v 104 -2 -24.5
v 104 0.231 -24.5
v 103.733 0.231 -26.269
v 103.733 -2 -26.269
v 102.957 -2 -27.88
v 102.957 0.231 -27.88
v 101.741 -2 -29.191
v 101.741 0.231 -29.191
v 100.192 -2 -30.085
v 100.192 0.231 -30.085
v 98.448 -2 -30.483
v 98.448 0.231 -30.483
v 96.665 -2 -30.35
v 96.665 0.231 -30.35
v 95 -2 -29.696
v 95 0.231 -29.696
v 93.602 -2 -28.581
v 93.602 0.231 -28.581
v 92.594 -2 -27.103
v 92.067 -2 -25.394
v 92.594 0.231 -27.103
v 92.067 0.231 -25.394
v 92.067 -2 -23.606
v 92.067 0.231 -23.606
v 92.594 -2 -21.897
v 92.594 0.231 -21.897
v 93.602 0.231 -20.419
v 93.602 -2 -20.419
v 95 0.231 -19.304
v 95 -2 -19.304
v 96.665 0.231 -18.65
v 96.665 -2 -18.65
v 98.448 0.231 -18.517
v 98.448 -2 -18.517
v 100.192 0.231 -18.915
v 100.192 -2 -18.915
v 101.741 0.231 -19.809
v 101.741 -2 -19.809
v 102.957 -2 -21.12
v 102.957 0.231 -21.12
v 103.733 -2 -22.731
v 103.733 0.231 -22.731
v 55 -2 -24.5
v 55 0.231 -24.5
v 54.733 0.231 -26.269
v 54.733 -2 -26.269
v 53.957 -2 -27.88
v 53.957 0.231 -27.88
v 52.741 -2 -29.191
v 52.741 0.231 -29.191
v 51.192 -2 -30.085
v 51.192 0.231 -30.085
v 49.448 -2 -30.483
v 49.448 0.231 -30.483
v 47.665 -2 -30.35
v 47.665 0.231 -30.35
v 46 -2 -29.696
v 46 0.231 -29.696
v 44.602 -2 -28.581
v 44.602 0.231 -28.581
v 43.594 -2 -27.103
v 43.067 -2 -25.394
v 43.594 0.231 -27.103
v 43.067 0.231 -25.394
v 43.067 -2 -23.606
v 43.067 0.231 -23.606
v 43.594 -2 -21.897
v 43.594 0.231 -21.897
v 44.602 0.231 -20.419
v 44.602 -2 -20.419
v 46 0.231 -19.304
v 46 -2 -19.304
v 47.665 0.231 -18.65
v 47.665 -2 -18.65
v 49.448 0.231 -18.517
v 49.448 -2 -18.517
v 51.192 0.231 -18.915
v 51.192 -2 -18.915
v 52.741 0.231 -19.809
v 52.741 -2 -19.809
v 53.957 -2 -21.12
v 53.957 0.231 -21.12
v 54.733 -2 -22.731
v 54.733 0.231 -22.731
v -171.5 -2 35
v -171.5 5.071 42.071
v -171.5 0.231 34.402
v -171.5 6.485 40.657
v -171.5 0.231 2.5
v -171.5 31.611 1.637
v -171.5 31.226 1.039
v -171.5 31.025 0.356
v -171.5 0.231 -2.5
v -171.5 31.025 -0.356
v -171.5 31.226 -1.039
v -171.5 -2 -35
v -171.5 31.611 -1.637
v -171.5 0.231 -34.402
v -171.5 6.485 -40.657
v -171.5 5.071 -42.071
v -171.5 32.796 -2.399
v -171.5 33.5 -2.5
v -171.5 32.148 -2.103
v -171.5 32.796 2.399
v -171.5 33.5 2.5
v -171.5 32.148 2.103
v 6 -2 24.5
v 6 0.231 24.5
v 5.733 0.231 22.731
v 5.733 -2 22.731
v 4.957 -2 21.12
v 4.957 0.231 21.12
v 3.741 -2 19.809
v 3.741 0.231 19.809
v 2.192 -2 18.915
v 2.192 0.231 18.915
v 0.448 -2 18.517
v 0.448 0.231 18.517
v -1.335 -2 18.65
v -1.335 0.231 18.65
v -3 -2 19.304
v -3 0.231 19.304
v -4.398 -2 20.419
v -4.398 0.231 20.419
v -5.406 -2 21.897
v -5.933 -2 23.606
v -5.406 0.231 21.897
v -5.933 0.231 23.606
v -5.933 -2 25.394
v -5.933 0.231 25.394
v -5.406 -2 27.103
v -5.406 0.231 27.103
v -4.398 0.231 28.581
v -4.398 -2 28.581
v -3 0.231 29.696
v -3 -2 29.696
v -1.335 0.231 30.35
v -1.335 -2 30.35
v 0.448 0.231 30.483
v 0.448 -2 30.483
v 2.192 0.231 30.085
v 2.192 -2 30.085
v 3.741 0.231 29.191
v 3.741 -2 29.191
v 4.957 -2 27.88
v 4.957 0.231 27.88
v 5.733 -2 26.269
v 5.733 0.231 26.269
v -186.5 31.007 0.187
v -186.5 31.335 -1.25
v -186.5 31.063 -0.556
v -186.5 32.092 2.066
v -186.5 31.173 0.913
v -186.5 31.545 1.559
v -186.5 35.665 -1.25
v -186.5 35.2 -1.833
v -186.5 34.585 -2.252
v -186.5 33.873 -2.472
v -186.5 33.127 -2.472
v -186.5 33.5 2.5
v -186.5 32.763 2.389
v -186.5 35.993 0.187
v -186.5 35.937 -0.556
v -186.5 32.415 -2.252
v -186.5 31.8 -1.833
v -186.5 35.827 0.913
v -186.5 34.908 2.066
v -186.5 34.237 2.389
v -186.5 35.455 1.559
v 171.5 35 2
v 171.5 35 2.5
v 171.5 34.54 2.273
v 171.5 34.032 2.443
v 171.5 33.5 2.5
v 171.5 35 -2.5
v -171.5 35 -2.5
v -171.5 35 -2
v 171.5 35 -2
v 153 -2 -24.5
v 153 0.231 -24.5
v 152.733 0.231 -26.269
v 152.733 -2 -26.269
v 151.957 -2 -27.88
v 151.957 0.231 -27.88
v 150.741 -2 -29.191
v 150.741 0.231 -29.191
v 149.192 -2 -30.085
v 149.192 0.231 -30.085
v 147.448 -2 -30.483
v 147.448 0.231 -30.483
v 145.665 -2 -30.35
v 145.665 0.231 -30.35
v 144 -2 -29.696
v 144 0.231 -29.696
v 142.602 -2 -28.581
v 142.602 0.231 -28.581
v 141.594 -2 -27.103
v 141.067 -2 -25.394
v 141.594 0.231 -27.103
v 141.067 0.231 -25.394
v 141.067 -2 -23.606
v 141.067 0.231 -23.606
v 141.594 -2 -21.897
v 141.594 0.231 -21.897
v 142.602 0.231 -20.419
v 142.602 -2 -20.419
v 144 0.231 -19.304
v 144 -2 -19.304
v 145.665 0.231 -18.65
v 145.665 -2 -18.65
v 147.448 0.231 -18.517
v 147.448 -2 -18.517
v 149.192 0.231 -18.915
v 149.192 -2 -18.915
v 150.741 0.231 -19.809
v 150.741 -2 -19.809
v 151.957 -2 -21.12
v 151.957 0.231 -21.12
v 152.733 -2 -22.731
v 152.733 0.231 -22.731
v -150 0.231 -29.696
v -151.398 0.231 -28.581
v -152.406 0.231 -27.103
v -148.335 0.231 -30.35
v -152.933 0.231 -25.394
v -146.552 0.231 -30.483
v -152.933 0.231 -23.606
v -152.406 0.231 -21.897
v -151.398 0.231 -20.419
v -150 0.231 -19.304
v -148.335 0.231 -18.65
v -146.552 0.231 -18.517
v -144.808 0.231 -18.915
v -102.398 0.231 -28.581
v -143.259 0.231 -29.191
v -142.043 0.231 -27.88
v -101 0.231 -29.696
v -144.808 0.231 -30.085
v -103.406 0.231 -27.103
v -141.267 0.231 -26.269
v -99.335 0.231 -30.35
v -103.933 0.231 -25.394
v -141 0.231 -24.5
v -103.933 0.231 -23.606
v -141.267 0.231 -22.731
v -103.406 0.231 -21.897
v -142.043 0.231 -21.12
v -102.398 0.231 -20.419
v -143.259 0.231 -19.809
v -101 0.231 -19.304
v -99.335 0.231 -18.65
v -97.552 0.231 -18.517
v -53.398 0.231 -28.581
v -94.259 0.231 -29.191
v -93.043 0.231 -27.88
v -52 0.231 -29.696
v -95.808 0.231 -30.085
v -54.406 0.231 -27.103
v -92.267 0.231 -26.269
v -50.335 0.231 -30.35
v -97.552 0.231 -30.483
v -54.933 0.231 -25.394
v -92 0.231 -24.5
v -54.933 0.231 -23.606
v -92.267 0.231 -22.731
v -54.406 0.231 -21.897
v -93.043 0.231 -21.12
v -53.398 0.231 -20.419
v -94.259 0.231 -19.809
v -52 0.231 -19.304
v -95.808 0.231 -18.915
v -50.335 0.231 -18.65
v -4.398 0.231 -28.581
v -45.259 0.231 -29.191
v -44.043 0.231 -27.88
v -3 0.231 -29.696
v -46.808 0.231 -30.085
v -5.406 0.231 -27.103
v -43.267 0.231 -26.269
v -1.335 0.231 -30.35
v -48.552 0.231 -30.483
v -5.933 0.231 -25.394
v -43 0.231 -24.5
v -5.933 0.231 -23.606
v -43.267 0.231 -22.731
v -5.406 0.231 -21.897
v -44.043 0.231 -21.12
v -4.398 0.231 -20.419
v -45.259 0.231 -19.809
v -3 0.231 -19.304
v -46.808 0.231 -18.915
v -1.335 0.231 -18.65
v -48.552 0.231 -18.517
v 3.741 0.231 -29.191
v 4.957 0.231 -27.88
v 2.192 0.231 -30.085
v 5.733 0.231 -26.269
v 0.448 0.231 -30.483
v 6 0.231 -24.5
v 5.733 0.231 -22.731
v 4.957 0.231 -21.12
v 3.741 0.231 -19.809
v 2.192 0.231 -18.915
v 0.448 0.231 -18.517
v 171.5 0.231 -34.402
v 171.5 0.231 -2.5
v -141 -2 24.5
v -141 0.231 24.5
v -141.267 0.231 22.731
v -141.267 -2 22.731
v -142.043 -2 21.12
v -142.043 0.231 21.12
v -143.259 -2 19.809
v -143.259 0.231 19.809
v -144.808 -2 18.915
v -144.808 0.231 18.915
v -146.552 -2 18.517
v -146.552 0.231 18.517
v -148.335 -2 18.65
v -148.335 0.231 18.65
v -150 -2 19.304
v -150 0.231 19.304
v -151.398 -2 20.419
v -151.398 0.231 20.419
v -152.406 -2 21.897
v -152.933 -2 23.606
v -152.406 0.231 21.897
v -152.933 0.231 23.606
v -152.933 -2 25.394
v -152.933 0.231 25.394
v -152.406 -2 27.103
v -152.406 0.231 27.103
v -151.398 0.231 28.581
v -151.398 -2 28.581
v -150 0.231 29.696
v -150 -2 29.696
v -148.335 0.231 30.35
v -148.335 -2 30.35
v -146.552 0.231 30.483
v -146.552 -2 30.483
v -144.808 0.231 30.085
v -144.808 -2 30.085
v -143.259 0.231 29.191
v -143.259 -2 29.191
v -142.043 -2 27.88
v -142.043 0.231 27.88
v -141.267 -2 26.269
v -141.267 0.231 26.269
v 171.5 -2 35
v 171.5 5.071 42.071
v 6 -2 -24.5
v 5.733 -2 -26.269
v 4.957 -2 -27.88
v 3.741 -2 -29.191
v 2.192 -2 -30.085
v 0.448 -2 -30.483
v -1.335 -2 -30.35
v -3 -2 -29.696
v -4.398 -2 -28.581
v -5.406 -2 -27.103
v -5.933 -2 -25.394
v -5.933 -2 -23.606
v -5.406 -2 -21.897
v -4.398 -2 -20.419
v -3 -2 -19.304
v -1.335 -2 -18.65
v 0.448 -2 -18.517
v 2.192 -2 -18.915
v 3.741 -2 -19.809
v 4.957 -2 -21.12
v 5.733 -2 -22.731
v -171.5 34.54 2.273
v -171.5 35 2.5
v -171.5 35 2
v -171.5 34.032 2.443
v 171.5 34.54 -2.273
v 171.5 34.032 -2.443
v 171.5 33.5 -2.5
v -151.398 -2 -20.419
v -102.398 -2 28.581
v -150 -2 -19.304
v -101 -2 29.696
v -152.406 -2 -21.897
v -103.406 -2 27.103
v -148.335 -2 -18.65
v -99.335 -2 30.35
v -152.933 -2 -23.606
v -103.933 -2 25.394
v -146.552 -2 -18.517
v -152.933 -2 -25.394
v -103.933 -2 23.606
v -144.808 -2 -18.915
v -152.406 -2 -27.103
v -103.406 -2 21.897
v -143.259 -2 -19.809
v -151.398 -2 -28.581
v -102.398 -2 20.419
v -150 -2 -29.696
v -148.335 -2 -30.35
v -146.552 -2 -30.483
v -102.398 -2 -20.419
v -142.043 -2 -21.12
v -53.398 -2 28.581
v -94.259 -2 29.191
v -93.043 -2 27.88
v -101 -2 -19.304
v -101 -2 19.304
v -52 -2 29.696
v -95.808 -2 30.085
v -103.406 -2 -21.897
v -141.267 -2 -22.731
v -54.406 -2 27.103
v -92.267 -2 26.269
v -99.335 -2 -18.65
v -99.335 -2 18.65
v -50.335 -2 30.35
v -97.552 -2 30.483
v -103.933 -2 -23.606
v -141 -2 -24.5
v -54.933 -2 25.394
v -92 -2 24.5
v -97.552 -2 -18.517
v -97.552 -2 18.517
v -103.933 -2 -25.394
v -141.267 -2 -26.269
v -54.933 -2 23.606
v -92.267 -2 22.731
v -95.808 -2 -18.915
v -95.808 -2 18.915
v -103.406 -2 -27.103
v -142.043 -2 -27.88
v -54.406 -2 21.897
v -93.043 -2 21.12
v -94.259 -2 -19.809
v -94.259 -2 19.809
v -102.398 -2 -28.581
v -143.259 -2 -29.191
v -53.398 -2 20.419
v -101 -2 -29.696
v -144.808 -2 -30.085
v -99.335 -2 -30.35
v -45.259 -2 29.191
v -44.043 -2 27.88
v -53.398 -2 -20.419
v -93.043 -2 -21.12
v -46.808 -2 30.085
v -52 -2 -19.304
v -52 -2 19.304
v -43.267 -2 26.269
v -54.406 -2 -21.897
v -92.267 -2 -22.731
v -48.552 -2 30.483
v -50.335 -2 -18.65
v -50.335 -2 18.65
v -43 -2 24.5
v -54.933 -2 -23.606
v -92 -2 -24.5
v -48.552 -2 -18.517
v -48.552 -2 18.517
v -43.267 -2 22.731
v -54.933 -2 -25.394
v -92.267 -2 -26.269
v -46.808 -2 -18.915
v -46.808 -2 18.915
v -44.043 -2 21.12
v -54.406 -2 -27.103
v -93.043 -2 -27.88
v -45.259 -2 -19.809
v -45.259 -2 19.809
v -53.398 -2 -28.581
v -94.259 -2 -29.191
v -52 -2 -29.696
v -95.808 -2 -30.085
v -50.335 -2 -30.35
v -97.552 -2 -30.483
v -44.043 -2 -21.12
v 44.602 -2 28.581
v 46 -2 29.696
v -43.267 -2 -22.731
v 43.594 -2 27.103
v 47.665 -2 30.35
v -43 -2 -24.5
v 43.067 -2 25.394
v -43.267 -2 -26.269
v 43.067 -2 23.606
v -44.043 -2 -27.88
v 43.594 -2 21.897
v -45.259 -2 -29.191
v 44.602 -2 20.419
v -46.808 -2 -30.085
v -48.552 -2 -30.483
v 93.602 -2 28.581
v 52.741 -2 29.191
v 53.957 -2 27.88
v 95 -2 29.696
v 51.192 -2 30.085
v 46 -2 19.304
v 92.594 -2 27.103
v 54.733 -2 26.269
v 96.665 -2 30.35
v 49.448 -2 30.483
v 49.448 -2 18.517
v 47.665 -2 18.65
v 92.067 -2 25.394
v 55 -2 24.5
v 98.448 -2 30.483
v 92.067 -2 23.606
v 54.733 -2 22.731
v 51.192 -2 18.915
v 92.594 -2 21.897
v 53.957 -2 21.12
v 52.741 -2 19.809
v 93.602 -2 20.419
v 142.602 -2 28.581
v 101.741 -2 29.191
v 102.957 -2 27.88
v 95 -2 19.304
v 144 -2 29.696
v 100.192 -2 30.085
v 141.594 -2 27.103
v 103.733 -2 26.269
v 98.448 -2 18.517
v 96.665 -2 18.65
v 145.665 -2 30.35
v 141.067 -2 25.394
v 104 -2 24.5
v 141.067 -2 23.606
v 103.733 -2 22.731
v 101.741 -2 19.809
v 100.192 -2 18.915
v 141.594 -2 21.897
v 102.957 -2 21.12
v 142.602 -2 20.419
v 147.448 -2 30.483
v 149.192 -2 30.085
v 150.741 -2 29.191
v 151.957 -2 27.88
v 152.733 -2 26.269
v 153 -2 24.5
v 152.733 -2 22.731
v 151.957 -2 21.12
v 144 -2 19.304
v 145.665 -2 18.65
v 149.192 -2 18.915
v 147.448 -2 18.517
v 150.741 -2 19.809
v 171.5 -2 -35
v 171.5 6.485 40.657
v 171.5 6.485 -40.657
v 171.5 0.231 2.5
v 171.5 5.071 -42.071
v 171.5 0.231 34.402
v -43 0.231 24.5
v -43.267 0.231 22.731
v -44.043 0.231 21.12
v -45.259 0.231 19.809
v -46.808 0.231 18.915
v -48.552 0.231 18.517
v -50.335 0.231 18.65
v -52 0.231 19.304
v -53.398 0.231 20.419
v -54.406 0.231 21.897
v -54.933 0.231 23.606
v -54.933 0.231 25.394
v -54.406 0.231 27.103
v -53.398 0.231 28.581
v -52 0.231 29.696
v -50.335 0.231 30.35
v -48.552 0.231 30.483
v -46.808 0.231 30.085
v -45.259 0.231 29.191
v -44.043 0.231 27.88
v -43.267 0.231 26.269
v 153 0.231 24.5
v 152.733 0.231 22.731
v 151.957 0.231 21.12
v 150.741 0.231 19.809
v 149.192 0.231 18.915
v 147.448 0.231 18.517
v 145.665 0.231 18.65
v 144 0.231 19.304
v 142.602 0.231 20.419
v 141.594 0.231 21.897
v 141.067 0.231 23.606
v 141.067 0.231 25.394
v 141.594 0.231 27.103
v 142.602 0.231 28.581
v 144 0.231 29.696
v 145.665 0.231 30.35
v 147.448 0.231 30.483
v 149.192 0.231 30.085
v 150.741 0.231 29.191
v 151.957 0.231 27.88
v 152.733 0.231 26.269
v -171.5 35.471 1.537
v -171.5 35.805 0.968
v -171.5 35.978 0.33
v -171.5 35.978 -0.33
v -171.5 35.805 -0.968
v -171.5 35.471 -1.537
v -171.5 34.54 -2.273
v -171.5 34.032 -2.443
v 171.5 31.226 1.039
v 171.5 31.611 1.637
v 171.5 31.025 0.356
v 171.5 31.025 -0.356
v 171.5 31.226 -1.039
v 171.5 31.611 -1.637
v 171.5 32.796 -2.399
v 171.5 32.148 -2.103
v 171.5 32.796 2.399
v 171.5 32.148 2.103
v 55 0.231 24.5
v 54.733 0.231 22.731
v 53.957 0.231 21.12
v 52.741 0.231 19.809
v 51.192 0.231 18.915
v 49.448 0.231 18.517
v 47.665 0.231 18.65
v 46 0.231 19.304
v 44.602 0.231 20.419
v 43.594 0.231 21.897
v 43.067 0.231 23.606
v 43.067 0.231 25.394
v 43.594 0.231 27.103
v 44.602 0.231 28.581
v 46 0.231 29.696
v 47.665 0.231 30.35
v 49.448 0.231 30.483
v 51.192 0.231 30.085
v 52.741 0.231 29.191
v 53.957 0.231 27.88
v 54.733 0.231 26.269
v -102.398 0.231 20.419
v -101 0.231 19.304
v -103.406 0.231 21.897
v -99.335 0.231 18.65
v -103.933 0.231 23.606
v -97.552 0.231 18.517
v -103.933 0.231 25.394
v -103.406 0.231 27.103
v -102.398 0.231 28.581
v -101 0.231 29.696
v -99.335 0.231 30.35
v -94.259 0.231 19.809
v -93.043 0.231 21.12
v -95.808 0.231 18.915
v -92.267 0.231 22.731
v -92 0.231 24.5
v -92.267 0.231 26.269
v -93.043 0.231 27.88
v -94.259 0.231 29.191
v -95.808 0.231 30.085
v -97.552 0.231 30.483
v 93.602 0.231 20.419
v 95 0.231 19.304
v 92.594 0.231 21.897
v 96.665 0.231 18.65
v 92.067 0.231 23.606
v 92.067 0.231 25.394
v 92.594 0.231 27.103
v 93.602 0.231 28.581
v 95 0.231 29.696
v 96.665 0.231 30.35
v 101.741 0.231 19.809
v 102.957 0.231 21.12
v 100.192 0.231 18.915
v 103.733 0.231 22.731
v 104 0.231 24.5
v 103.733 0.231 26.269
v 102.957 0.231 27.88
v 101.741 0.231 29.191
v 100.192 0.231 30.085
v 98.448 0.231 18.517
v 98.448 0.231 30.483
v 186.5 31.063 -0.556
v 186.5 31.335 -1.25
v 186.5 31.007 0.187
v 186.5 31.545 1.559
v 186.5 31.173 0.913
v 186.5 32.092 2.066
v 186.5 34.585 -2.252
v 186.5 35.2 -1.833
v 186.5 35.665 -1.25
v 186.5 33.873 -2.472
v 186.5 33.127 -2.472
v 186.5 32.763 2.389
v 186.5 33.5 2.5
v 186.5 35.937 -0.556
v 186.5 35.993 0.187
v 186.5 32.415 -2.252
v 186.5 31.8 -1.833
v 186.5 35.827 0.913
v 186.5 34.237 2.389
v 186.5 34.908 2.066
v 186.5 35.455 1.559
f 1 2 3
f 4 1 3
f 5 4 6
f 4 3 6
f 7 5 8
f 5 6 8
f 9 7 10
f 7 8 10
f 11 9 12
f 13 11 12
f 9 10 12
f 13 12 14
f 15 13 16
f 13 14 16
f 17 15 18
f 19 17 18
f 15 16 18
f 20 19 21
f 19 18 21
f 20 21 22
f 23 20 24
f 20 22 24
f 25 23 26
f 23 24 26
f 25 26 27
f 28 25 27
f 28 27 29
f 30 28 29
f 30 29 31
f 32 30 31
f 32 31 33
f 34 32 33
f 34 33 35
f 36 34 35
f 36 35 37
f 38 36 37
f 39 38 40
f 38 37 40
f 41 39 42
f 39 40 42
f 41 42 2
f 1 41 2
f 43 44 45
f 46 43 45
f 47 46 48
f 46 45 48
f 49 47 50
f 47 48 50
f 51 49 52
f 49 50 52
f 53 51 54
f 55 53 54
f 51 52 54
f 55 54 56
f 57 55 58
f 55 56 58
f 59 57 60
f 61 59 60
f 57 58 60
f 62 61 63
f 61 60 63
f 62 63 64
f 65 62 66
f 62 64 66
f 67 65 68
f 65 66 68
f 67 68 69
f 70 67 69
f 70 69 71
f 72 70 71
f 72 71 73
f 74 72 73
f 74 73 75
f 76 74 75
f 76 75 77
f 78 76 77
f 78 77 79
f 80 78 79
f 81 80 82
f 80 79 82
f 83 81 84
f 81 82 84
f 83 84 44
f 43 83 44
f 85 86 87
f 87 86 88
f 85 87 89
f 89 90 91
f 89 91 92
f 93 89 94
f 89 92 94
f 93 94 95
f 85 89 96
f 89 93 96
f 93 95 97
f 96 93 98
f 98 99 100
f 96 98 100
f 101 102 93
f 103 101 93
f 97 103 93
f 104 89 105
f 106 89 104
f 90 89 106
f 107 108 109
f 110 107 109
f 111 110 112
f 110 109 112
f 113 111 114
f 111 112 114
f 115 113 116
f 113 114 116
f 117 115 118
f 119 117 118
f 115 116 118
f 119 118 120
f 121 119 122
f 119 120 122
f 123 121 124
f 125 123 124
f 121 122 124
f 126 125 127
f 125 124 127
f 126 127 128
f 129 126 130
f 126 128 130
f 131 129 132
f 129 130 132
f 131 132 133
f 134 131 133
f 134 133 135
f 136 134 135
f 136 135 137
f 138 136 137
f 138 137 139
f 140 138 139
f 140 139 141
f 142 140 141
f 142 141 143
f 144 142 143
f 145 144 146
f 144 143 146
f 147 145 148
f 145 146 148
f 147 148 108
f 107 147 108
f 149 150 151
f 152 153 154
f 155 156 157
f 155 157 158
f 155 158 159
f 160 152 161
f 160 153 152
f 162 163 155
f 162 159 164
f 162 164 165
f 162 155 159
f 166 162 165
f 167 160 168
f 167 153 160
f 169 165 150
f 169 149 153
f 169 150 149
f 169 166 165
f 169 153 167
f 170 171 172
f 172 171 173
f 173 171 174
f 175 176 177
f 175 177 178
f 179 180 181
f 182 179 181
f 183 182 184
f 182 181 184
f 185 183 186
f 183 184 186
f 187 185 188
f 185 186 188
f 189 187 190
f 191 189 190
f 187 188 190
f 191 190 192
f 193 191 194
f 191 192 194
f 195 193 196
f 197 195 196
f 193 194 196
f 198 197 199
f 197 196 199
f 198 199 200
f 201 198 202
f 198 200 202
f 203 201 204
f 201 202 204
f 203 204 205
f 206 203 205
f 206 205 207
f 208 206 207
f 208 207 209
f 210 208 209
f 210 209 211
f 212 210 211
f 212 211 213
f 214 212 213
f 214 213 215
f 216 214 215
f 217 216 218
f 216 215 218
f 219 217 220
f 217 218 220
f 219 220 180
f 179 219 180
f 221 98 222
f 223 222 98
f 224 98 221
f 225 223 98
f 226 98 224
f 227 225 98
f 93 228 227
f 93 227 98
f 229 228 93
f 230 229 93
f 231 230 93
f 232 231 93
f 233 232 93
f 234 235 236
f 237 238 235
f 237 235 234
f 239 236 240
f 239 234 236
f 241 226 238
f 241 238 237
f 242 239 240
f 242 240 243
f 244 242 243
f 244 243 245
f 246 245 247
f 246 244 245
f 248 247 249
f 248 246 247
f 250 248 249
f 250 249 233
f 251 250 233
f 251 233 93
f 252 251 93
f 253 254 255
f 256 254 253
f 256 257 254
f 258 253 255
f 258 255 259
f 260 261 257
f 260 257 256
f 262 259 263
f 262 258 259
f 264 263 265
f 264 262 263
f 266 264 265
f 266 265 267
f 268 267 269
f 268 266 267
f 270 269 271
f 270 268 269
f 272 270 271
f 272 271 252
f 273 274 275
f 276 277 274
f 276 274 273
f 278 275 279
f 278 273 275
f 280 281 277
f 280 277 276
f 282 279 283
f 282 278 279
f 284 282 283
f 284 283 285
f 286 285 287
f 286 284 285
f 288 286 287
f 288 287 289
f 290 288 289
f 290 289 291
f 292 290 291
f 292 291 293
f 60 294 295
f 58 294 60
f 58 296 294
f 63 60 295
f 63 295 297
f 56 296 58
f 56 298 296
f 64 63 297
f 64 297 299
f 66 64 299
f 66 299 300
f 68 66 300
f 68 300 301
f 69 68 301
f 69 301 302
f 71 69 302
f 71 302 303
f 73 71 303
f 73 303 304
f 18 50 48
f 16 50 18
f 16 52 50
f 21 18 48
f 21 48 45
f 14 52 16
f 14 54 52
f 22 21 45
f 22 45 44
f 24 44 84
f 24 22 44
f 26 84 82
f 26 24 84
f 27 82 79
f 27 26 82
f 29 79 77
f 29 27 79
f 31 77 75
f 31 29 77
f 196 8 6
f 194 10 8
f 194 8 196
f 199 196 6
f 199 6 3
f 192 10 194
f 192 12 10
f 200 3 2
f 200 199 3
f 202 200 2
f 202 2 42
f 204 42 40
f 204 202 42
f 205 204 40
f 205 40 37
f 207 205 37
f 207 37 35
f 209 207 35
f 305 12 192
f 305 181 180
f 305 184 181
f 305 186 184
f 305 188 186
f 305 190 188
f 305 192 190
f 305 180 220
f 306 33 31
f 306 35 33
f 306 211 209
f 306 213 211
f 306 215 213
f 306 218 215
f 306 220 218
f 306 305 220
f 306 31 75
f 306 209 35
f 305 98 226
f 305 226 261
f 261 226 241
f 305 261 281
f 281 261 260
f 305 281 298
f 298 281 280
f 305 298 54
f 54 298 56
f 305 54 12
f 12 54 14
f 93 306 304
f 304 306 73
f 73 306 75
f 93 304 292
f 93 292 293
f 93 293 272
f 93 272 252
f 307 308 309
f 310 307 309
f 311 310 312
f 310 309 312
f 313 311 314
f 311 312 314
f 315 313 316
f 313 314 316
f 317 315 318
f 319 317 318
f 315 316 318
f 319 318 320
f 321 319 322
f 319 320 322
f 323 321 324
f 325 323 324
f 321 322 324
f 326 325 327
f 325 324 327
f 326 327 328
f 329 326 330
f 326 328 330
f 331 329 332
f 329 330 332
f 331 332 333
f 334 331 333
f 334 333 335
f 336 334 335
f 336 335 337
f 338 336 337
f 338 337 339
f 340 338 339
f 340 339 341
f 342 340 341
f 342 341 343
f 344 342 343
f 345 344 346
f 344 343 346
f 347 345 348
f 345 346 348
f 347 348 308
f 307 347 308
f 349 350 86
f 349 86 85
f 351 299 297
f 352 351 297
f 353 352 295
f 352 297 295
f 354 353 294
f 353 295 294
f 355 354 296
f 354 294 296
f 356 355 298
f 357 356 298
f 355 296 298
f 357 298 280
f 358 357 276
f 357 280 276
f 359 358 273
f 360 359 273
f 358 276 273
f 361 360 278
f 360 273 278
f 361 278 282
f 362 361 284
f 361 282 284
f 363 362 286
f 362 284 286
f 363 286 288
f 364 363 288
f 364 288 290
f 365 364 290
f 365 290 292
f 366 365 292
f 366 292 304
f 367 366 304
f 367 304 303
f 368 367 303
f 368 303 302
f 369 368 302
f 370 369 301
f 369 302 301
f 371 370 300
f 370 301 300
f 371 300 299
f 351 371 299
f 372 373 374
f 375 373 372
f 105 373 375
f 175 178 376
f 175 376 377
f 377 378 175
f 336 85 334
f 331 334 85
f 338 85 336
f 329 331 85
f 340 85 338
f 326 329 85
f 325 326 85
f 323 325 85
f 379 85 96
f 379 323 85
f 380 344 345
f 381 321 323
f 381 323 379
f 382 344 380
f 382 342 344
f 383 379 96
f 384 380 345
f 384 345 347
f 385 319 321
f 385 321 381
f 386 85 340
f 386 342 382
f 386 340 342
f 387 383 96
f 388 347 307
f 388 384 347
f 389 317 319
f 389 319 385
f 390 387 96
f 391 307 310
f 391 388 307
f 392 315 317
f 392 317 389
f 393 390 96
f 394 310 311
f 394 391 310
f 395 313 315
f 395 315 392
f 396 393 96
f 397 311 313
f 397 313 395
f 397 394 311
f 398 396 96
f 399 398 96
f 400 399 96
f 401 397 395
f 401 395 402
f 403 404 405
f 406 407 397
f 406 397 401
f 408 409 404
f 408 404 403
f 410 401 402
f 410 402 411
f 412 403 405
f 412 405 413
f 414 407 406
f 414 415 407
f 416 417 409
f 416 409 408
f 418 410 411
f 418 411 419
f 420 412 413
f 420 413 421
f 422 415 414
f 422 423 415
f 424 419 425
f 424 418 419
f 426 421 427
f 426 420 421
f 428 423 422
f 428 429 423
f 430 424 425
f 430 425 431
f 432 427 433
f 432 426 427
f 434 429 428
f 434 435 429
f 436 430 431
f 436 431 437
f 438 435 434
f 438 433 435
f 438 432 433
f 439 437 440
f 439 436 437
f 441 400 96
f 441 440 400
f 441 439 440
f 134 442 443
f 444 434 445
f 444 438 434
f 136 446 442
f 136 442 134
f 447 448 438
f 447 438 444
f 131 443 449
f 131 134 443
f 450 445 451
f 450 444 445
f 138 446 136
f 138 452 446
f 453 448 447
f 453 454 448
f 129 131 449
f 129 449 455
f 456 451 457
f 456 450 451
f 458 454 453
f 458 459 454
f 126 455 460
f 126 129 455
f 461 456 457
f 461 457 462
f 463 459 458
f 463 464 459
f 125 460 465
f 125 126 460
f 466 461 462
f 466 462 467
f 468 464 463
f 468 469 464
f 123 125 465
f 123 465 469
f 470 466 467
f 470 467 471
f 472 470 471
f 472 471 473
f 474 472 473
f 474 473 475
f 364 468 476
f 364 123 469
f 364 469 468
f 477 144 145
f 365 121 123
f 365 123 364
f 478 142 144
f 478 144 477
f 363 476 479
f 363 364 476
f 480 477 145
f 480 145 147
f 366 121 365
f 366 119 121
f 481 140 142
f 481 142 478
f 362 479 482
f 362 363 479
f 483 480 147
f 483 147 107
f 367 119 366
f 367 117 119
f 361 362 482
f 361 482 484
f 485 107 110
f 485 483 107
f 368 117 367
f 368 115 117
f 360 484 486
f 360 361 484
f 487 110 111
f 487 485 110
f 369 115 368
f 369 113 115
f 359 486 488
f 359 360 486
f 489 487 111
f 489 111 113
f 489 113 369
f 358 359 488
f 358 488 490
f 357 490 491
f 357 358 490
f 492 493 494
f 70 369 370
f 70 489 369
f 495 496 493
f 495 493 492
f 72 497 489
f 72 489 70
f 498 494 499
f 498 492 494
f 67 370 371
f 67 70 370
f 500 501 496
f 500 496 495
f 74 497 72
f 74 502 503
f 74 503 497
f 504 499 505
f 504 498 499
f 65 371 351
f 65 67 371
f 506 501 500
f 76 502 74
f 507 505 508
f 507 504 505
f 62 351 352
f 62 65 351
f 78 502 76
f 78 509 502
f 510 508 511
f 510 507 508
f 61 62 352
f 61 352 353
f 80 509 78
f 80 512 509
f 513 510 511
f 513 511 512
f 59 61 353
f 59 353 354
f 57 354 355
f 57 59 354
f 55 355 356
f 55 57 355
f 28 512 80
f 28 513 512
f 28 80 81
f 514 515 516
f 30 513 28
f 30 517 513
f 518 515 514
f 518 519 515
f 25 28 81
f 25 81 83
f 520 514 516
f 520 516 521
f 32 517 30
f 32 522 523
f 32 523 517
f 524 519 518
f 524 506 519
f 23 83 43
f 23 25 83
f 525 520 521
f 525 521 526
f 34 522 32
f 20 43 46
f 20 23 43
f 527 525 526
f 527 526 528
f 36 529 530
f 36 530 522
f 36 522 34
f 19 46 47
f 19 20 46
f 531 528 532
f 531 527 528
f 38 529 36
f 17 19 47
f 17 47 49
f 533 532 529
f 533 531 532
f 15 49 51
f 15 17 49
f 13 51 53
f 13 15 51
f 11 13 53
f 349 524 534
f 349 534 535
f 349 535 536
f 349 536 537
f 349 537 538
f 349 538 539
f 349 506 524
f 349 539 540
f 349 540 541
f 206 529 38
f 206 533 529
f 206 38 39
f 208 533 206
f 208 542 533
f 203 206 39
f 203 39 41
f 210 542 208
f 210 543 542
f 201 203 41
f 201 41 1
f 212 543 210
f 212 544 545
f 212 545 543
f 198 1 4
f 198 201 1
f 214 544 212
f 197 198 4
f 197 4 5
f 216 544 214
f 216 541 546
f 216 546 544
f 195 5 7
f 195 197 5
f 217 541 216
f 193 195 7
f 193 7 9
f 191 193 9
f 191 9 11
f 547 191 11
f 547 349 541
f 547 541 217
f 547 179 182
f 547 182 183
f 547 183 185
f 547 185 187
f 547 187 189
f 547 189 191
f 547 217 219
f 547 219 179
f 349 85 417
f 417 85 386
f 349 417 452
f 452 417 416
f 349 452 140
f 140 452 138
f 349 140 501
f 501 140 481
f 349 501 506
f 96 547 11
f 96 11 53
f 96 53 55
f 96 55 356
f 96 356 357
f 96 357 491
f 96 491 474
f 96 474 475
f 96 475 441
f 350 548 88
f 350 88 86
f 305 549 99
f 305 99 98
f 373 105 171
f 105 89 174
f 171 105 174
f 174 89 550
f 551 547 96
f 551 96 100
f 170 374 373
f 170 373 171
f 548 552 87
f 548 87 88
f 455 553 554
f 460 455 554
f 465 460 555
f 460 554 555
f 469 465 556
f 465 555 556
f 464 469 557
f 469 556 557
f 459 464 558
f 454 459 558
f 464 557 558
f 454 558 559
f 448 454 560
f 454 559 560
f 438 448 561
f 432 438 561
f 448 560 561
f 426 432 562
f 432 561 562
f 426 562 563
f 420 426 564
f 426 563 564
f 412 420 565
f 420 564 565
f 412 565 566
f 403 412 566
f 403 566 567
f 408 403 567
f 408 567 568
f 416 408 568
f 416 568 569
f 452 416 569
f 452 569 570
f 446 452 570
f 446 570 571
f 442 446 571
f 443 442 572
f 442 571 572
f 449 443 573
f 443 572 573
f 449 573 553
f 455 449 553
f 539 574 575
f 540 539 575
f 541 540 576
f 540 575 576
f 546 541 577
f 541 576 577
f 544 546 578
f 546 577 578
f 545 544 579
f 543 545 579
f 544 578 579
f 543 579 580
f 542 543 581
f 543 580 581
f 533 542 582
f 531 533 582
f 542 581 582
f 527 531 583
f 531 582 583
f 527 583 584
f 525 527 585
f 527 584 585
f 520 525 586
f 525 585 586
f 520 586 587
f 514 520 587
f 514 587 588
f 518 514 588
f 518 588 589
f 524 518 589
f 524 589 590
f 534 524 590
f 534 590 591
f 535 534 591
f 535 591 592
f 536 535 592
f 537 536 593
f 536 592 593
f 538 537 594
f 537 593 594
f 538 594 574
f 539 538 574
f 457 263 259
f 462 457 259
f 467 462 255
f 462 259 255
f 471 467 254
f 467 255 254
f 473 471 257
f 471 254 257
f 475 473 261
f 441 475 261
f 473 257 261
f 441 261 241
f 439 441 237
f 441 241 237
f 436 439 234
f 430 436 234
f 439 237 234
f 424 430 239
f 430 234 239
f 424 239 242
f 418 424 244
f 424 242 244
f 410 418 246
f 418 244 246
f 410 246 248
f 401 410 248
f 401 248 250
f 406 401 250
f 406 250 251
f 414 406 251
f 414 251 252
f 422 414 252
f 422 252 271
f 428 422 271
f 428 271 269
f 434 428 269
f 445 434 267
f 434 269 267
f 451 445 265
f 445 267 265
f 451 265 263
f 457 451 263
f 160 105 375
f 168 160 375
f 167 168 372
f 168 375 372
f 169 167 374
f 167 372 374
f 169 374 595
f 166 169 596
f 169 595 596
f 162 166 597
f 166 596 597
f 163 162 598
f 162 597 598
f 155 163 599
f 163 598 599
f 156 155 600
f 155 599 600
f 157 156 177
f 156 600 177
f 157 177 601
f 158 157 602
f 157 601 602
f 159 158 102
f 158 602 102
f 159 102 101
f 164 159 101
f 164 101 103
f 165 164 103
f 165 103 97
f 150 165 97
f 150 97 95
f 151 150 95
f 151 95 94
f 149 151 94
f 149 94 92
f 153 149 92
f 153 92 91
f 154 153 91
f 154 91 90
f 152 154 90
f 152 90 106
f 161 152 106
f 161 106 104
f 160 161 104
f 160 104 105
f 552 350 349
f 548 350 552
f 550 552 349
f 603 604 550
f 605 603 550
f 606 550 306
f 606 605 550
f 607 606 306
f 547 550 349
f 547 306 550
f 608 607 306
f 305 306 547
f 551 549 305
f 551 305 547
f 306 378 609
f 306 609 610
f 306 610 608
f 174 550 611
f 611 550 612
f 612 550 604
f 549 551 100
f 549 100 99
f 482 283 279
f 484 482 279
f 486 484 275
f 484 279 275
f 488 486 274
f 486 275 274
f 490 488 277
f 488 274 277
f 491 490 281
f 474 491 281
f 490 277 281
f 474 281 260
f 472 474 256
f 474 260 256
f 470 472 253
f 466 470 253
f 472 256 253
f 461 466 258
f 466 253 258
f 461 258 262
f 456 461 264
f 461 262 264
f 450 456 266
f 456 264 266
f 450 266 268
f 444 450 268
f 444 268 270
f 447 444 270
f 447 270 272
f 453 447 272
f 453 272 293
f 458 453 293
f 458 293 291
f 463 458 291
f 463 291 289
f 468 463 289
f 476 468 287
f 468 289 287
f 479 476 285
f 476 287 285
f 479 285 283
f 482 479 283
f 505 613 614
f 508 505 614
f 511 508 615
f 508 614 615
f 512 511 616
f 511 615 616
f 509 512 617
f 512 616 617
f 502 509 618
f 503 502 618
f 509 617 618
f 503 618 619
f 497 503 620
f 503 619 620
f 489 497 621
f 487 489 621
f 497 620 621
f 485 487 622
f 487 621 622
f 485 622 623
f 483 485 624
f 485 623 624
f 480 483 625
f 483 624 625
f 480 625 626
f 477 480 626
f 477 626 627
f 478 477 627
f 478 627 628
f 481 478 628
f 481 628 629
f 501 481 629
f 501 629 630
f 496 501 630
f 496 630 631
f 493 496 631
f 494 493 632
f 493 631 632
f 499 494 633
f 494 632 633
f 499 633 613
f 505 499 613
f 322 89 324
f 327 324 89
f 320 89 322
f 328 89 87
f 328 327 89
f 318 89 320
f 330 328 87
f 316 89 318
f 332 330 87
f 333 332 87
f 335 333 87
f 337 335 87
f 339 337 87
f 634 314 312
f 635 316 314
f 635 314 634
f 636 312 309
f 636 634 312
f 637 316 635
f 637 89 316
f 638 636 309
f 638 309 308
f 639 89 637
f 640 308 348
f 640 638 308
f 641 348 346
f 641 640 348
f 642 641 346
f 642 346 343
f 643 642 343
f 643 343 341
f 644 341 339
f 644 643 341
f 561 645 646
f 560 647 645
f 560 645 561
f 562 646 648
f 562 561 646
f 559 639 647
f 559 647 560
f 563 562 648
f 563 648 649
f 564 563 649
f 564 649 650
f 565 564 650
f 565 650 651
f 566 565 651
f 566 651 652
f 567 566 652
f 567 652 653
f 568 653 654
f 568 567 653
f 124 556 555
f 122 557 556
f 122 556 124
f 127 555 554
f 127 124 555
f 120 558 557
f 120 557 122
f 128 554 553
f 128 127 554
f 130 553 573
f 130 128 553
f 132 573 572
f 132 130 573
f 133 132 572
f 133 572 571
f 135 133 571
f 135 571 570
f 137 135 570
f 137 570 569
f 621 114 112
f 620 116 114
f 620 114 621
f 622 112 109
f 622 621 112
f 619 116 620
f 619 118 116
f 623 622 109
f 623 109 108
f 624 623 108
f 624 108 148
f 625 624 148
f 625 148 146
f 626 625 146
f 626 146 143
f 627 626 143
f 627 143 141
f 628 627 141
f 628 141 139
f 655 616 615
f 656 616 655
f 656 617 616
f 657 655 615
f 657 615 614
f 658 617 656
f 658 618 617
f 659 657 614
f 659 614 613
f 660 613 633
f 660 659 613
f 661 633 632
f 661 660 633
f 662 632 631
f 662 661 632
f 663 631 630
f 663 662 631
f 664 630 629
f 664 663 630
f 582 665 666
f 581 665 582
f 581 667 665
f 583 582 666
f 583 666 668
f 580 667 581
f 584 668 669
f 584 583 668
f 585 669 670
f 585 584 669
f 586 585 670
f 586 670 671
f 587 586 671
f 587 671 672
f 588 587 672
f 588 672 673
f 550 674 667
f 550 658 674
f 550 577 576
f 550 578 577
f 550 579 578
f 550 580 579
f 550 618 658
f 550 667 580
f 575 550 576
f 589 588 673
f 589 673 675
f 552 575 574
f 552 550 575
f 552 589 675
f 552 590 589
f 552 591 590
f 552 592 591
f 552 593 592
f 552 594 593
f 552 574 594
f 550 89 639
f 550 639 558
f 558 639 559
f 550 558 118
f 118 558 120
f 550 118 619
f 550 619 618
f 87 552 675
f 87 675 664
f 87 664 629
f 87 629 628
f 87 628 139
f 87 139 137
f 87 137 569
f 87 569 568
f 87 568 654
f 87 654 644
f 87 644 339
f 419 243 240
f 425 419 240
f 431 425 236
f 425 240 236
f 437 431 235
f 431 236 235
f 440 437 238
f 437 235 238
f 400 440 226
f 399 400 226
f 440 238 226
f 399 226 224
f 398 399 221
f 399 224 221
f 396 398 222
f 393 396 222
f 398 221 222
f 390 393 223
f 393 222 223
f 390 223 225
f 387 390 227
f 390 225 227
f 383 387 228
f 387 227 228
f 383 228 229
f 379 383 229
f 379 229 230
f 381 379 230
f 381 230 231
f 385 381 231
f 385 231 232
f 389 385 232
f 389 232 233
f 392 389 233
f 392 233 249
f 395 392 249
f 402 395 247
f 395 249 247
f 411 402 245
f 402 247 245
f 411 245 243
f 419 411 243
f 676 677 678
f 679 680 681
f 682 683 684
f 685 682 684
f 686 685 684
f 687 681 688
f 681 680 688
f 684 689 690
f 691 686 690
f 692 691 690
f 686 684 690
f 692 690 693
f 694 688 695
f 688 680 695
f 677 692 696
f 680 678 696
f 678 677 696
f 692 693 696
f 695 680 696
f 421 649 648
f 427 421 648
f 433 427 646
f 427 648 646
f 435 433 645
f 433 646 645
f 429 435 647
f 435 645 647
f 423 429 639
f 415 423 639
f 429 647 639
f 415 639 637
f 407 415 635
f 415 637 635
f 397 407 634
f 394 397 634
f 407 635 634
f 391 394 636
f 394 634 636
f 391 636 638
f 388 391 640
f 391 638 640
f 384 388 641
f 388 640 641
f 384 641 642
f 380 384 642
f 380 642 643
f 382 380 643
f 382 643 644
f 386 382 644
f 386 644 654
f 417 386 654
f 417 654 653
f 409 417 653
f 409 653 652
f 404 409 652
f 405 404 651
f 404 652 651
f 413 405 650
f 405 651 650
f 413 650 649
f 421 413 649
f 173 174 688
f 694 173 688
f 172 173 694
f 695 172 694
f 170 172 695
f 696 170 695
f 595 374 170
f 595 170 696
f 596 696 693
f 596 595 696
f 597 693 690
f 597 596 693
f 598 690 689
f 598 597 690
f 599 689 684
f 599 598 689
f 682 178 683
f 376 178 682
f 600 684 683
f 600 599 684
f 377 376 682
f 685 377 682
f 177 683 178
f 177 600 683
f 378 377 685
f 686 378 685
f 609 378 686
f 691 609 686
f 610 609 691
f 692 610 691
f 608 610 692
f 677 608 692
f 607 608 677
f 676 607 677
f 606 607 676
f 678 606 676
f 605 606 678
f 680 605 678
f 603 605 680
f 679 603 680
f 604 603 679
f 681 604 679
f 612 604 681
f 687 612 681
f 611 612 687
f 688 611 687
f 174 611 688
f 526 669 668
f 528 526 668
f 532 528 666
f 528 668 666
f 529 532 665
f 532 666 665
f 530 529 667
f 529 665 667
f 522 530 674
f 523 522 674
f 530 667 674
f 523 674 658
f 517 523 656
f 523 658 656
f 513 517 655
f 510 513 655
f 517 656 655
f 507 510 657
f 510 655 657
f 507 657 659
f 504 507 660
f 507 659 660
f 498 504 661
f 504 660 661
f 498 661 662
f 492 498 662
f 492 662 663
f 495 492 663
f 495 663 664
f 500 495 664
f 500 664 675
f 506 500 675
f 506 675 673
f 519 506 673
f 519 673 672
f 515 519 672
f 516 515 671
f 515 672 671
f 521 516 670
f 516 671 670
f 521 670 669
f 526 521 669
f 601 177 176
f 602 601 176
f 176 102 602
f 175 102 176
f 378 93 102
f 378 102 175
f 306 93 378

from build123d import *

# Parameters (mm, degrees)
SKETCH3_W                = 343
SKETCH3_H                = 5
BOSS_EXTRUDE1_DEPTH      = 35
SKETCH6_R                = 2.5
BOSS_EXTRUDE3_DEPTH      = 15
BOSS_EXTRUDE3_DEPTH_BACK = 358
BOSS_EXTRUDE4_DEPTH      = 343
SKETCH8_R                = 6
SKETCH8_R_2              = 5.999960458
CUT_EXTRUDE1_DEPTH       = 2.23071


with BuildPart() as part:
    # Sketch3 → Boss-Extrude1 (new body)
    with BuildSketch(Plane(origin=(0, 0, 0), x_dir=(1, 0, 0), z_dir=(0, 1, 0))):
        Rectangle(SKETCH3_W, SKETCH3_H)
    extrude(amount=BOSS_EXTRUDE1_DEPTH)

    # Sketch6 → Boss-Extrude3 (add, two sides)
    with BuildSketch(Plane.ZY.offset(171.5)) as boss_extrude3_sk:
        with Locations((0, 33.5)):
            Circle(SKETCH6_R)
    extrude(amount=BOSS_EXTRUDE3_DEPTH)
    extrude(boss_extrude3_sk.sketch, amount=-BOSS_EXTRUDE3_DEPTH_BACK)

    # Sketch7 → Boss-Extrude4 (add)
    with BuildSketch(Plane(origin=(171.5, 0, 0), x_dir=(0, 0, -1), z_dir=(1, 0, 0))):
        Polygon((35, -2), (42.071067812, 5.071067812), (40.656854249, 6.485281374), (34.402283019, 0.230710143), (-34.402283019, 0.230710143), (-40.656854249, 6.485281374), (-42.071067812, 5.071067812), (-35, -2), align=None)
    extrude(amount=-BOSS_EXTRUDE4_DEPTH)

    # Sketch8 → Cut-Extrude1 (cut)
    with BuildSketch(Plane(origin=(0, 0.230710143, 0), x_dir=(1, 0, 0), z_dir=(0, 1, 0))):
        with Locations((0, -24.5)):
            Circle(SKETCH8_R)
        with Locations((-49, -24.5)):
            Circle(SKETCH8_R_2)
        with Locations((-98, -24.5)):
            Circle(SKETCH8_R)
        with Locations((-147, -24.5)):
            Circle(SKETCH8_R)
        with Locations((147, -24.5)):
            Circle(SKETCH8_R)
        with Locations((98, -24.5)):
            Circle(SKETCH8_R)
        with Locations((49, -24.5)):
            Circle(SKETCH8_R_2)
        with Locations((98, 24.5)):
            Circle(SKETCH8_R)
        with Locations((147, 24.5)):
            Circle(SKETCH8_R)
        with Locations((49, 24.5)):
            Circle(SKETCH8_R_2)
        with Locations((0, 24.5)):
            Circle(SKETCH8_R)
        with Locations((-147, 24.5)):
            Circle(SKETCH8_R)
        with Locations((-98, 24.5)):
            Circle(SKETCH8_R)
        with Locations((-49, 24.5)):
            Circle(SKETCH8_R_2)
    extrude(amount=-CUT_EXTRUDE1_DEPTH, mode=Mode.SUBTRACT)


solid = part.part
